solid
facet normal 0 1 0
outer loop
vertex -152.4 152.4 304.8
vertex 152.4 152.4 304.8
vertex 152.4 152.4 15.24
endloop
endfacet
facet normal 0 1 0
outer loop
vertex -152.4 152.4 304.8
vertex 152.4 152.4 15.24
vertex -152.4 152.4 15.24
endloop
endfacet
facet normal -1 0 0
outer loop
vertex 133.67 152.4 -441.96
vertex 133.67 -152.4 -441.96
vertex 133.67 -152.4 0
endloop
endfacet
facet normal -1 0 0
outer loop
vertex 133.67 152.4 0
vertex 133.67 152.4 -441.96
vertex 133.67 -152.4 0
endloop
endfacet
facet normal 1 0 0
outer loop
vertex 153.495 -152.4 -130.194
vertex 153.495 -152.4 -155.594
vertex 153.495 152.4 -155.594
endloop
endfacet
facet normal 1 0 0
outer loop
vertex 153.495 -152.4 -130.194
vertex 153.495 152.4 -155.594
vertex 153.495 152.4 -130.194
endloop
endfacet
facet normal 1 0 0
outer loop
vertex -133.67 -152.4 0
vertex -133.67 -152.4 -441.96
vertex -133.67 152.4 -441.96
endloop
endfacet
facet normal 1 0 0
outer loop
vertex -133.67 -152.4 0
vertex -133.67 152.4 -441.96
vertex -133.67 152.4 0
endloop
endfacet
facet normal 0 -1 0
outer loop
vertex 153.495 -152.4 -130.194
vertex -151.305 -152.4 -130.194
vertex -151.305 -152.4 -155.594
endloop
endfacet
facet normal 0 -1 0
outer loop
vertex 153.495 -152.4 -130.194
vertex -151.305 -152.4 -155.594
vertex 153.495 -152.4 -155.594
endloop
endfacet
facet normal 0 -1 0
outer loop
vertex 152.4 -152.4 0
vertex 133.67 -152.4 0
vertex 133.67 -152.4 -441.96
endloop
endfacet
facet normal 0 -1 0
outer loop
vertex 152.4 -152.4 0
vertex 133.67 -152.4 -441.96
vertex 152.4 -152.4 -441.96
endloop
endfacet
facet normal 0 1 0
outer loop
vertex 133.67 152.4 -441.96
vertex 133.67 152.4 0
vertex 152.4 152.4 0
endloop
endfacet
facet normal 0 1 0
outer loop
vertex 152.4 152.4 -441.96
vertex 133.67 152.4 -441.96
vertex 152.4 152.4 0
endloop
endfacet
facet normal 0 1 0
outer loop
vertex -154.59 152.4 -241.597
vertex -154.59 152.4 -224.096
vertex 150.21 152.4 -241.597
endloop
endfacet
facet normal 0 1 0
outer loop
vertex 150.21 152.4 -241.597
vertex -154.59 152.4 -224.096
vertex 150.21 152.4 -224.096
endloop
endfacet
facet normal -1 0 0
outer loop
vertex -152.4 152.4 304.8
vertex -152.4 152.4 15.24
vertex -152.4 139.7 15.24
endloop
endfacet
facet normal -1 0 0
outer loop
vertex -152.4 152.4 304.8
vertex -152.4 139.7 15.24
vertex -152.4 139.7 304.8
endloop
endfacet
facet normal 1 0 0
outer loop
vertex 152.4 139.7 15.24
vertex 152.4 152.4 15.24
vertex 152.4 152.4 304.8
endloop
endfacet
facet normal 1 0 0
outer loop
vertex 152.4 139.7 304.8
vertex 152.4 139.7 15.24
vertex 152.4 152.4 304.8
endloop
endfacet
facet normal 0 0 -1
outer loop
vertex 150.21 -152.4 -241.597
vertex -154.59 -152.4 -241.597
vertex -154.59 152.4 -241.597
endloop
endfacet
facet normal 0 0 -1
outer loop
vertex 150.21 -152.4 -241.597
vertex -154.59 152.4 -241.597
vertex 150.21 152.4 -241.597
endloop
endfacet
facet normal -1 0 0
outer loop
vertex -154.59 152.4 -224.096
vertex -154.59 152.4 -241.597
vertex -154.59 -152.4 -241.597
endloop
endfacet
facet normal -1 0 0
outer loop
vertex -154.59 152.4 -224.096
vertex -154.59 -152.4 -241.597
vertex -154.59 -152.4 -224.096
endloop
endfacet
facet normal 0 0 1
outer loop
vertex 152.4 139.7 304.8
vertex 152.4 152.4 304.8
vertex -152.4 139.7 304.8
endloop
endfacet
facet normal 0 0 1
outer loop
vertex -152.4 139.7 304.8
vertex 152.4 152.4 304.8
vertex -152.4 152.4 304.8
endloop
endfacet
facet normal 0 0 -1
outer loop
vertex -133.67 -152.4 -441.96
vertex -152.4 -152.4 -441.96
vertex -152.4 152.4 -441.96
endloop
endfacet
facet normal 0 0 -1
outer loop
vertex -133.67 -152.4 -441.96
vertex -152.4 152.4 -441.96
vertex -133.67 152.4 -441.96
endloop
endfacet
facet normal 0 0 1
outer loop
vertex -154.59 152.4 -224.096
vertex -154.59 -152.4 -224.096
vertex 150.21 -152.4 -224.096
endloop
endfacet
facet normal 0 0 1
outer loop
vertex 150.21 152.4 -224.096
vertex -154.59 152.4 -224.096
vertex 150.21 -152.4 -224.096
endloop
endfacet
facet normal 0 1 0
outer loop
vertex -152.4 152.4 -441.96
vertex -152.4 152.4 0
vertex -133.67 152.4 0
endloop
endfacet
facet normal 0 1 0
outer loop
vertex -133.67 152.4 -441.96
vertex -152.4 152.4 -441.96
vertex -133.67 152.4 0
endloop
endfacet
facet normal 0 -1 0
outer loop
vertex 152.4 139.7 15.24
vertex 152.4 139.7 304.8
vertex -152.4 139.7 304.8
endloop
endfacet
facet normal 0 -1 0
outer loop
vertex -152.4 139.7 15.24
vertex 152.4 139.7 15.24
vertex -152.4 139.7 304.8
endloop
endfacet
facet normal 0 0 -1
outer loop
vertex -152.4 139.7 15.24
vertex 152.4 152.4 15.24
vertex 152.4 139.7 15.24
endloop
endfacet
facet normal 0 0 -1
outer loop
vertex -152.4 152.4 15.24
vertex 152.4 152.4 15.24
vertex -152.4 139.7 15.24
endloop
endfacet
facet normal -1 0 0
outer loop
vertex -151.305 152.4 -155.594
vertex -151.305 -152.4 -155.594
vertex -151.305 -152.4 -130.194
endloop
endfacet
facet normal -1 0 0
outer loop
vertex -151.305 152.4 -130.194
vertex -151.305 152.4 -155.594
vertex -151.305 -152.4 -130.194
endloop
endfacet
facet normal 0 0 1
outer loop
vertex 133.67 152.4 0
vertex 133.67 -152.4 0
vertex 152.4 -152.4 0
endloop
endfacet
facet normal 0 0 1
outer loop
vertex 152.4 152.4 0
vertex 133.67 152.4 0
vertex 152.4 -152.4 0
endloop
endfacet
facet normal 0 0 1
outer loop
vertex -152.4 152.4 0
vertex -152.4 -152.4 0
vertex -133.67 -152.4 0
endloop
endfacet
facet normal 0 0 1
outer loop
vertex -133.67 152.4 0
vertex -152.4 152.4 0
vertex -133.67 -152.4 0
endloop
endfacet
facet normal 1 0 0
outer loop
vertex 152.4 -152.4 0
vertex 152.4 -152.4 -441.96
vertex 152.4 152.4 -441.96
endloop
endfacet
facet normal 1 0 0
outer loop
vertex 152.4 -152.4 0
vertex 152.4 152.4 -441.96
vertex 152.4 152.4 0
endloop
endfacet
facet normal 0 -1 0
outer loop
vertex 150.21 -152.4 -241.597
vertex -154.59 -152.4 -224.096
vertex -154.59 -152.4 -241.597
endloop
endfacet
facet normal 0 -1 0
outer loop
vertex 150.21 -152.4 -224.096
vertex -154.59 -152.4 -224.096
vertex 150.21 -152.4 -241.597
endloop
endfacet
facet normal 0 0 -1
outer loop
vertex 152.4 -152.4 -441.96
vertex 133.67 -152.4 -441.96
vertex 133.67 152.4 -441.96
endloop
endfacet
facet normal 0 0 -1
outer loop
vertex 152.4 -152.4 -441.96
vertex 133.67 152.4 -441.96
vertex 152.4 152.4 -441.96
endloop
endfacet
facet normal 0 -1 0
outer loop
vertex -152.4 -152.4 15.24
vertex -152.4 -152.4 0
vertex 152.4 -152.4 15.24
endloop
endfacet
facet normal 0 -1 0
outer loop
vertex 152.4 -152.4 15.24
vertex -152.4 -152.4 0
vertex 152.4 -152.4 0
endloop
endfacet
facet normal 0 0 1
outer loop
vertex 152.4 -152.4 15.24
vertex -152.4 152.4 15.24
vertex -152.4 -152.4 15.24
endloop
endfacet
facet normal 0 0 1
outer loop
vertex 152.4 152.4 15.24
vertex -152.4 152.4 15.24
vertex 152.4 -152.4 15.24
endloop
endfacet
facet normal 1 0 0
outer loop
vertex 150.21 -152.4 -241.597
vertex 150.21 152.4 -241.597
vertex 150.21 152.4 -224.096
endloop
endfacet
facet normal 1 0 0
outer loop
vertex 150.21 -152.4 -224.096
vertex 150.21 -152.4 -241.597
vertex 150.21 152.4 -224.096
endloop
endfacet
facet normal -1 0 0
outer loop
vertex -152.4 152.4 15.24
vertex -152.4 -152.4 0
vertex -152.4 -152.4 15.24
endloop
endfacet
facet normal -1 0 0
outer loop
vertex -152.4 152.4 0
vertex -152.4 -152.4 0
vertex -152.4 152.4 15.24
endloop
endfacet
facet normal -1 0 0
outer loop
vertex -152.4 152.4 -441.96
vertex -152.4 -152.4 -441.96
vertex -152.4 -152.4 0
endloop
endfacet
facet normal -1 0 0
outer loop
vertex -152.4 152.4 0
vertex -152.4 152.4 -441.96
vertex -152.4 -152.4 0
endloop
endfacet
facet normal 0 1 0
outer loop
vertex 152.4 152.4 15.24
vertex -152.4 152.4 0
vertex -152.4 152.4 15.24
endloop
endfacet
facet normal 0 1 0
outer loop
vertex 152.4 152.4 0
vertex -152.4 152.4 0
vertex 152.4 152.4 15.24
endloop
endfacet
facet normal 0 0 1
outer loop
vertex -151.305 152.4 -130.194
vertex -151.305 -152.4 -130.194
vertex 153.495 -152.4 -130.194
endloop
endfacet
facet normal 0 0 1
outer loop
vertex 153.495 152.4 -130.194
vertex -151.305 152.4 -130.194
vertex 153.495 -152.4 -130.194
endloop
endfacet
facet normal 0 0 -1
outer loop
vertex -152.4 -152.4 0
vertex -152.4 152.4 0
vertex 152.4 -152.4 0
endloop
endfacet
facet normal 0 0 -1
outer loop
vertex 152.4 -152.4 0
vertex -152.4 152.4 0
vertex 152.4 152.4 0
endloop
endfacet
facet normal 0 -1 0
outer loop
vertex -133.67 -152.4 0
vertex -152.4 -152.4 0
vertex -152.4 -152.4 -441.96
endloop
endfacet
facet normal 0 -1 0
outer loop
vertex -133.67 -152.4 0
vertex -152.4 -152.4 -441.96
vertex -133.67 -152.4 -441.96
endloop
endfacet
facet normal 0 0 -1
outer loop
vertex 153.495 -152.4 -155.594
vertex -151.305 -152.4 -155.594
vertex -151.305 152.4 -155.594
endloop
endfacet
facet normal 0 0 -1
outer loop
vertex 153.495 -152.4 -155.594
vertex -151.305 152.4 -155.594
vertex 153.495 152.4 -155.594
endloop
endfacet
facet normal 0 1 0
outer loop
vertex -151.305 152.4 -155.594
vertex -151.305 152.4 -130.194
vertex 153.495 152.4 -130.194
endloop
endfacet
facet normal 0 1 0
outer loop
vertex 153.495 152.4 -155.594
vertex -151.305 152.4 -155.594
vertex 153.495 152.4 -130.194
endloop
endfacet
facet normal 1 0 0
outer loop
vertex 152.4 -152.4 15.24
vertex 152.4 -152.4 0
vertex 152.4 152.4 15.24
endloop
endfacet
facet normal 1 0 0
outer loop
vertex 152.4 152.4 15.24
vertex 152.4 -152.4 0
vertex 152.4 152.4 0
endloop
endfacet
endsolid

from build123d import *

# Parameters (mm, degrees)
F0_W     = 304.8
F0_H     = 304.8
F1_DEPTH = 15.24
F2_W     = 18.729774
F2_H     = 441.96
F3_DEPTH = 304.8
F4_W     = 304.8
F4_H     = 289.56
F5_DEPTH = 12.7
F6_W     = 304.8
F6_H     = 17.500475
F7_DEPTH = 304.8
F8_W     = 304.8
F8_H     = 25.4
F9_DEPTH = 304.8


with BuildPart() as f1:
    # F0 (on Top) → F1 (new body)
    with BuildSketch(Plane.XY):
        Rectangle(F0_W, F0_H)
    extrude(amount=F1_DEPTH)


with BuildPart() as f3:
    # F2 (on face) → F3 (new body)
    with BuildSketch(Plane.XZ.offset(152.4)):
        with Locations((-143.035113, -220.98)):
            Rectangle(F2_W, F2_H)
        with Locations((143.035113, -220.98)):
            Rectangle(F2_W, F2_H)
    extrude(amount=-F3_DEPTH)


with BuildPart() as f5:
    # F4 (on face) → F5 (new body)
    with BuildSketch(Plane(origin=(0, 152.4, 0), x_dir=(-1, 0, 0), z_dir=(0, 1, 0))):
        with Locations((0, 160.02)):
            Rectangle(F4_W, F4_H)
    extrude(amount=-F5_DEPTH)


with BuildPart() as f7:
    # F6 (on face) → F7 (new body)
    with BuildSketch(Plane.XZ.offset(152.4)):
        with Locations((-2.190225, -232.846349)):
            Rectangle(F6_W, F6_H)
    extrude(amount=-F7_DEPTH)


with BuildPart() as f9:
    # F8 (on face) → F9 (new body)
    with BuildSketch(Plane.XZ.offset(152.4)):
        with Locations((1.095101, -142.894148)):
            Rectangle(F8_W, F8_H)
    extrude(amount=-F9_DEPTH)


solid = Compound([f1.part, f3.part, f5.part, f7.part, f9.part])
